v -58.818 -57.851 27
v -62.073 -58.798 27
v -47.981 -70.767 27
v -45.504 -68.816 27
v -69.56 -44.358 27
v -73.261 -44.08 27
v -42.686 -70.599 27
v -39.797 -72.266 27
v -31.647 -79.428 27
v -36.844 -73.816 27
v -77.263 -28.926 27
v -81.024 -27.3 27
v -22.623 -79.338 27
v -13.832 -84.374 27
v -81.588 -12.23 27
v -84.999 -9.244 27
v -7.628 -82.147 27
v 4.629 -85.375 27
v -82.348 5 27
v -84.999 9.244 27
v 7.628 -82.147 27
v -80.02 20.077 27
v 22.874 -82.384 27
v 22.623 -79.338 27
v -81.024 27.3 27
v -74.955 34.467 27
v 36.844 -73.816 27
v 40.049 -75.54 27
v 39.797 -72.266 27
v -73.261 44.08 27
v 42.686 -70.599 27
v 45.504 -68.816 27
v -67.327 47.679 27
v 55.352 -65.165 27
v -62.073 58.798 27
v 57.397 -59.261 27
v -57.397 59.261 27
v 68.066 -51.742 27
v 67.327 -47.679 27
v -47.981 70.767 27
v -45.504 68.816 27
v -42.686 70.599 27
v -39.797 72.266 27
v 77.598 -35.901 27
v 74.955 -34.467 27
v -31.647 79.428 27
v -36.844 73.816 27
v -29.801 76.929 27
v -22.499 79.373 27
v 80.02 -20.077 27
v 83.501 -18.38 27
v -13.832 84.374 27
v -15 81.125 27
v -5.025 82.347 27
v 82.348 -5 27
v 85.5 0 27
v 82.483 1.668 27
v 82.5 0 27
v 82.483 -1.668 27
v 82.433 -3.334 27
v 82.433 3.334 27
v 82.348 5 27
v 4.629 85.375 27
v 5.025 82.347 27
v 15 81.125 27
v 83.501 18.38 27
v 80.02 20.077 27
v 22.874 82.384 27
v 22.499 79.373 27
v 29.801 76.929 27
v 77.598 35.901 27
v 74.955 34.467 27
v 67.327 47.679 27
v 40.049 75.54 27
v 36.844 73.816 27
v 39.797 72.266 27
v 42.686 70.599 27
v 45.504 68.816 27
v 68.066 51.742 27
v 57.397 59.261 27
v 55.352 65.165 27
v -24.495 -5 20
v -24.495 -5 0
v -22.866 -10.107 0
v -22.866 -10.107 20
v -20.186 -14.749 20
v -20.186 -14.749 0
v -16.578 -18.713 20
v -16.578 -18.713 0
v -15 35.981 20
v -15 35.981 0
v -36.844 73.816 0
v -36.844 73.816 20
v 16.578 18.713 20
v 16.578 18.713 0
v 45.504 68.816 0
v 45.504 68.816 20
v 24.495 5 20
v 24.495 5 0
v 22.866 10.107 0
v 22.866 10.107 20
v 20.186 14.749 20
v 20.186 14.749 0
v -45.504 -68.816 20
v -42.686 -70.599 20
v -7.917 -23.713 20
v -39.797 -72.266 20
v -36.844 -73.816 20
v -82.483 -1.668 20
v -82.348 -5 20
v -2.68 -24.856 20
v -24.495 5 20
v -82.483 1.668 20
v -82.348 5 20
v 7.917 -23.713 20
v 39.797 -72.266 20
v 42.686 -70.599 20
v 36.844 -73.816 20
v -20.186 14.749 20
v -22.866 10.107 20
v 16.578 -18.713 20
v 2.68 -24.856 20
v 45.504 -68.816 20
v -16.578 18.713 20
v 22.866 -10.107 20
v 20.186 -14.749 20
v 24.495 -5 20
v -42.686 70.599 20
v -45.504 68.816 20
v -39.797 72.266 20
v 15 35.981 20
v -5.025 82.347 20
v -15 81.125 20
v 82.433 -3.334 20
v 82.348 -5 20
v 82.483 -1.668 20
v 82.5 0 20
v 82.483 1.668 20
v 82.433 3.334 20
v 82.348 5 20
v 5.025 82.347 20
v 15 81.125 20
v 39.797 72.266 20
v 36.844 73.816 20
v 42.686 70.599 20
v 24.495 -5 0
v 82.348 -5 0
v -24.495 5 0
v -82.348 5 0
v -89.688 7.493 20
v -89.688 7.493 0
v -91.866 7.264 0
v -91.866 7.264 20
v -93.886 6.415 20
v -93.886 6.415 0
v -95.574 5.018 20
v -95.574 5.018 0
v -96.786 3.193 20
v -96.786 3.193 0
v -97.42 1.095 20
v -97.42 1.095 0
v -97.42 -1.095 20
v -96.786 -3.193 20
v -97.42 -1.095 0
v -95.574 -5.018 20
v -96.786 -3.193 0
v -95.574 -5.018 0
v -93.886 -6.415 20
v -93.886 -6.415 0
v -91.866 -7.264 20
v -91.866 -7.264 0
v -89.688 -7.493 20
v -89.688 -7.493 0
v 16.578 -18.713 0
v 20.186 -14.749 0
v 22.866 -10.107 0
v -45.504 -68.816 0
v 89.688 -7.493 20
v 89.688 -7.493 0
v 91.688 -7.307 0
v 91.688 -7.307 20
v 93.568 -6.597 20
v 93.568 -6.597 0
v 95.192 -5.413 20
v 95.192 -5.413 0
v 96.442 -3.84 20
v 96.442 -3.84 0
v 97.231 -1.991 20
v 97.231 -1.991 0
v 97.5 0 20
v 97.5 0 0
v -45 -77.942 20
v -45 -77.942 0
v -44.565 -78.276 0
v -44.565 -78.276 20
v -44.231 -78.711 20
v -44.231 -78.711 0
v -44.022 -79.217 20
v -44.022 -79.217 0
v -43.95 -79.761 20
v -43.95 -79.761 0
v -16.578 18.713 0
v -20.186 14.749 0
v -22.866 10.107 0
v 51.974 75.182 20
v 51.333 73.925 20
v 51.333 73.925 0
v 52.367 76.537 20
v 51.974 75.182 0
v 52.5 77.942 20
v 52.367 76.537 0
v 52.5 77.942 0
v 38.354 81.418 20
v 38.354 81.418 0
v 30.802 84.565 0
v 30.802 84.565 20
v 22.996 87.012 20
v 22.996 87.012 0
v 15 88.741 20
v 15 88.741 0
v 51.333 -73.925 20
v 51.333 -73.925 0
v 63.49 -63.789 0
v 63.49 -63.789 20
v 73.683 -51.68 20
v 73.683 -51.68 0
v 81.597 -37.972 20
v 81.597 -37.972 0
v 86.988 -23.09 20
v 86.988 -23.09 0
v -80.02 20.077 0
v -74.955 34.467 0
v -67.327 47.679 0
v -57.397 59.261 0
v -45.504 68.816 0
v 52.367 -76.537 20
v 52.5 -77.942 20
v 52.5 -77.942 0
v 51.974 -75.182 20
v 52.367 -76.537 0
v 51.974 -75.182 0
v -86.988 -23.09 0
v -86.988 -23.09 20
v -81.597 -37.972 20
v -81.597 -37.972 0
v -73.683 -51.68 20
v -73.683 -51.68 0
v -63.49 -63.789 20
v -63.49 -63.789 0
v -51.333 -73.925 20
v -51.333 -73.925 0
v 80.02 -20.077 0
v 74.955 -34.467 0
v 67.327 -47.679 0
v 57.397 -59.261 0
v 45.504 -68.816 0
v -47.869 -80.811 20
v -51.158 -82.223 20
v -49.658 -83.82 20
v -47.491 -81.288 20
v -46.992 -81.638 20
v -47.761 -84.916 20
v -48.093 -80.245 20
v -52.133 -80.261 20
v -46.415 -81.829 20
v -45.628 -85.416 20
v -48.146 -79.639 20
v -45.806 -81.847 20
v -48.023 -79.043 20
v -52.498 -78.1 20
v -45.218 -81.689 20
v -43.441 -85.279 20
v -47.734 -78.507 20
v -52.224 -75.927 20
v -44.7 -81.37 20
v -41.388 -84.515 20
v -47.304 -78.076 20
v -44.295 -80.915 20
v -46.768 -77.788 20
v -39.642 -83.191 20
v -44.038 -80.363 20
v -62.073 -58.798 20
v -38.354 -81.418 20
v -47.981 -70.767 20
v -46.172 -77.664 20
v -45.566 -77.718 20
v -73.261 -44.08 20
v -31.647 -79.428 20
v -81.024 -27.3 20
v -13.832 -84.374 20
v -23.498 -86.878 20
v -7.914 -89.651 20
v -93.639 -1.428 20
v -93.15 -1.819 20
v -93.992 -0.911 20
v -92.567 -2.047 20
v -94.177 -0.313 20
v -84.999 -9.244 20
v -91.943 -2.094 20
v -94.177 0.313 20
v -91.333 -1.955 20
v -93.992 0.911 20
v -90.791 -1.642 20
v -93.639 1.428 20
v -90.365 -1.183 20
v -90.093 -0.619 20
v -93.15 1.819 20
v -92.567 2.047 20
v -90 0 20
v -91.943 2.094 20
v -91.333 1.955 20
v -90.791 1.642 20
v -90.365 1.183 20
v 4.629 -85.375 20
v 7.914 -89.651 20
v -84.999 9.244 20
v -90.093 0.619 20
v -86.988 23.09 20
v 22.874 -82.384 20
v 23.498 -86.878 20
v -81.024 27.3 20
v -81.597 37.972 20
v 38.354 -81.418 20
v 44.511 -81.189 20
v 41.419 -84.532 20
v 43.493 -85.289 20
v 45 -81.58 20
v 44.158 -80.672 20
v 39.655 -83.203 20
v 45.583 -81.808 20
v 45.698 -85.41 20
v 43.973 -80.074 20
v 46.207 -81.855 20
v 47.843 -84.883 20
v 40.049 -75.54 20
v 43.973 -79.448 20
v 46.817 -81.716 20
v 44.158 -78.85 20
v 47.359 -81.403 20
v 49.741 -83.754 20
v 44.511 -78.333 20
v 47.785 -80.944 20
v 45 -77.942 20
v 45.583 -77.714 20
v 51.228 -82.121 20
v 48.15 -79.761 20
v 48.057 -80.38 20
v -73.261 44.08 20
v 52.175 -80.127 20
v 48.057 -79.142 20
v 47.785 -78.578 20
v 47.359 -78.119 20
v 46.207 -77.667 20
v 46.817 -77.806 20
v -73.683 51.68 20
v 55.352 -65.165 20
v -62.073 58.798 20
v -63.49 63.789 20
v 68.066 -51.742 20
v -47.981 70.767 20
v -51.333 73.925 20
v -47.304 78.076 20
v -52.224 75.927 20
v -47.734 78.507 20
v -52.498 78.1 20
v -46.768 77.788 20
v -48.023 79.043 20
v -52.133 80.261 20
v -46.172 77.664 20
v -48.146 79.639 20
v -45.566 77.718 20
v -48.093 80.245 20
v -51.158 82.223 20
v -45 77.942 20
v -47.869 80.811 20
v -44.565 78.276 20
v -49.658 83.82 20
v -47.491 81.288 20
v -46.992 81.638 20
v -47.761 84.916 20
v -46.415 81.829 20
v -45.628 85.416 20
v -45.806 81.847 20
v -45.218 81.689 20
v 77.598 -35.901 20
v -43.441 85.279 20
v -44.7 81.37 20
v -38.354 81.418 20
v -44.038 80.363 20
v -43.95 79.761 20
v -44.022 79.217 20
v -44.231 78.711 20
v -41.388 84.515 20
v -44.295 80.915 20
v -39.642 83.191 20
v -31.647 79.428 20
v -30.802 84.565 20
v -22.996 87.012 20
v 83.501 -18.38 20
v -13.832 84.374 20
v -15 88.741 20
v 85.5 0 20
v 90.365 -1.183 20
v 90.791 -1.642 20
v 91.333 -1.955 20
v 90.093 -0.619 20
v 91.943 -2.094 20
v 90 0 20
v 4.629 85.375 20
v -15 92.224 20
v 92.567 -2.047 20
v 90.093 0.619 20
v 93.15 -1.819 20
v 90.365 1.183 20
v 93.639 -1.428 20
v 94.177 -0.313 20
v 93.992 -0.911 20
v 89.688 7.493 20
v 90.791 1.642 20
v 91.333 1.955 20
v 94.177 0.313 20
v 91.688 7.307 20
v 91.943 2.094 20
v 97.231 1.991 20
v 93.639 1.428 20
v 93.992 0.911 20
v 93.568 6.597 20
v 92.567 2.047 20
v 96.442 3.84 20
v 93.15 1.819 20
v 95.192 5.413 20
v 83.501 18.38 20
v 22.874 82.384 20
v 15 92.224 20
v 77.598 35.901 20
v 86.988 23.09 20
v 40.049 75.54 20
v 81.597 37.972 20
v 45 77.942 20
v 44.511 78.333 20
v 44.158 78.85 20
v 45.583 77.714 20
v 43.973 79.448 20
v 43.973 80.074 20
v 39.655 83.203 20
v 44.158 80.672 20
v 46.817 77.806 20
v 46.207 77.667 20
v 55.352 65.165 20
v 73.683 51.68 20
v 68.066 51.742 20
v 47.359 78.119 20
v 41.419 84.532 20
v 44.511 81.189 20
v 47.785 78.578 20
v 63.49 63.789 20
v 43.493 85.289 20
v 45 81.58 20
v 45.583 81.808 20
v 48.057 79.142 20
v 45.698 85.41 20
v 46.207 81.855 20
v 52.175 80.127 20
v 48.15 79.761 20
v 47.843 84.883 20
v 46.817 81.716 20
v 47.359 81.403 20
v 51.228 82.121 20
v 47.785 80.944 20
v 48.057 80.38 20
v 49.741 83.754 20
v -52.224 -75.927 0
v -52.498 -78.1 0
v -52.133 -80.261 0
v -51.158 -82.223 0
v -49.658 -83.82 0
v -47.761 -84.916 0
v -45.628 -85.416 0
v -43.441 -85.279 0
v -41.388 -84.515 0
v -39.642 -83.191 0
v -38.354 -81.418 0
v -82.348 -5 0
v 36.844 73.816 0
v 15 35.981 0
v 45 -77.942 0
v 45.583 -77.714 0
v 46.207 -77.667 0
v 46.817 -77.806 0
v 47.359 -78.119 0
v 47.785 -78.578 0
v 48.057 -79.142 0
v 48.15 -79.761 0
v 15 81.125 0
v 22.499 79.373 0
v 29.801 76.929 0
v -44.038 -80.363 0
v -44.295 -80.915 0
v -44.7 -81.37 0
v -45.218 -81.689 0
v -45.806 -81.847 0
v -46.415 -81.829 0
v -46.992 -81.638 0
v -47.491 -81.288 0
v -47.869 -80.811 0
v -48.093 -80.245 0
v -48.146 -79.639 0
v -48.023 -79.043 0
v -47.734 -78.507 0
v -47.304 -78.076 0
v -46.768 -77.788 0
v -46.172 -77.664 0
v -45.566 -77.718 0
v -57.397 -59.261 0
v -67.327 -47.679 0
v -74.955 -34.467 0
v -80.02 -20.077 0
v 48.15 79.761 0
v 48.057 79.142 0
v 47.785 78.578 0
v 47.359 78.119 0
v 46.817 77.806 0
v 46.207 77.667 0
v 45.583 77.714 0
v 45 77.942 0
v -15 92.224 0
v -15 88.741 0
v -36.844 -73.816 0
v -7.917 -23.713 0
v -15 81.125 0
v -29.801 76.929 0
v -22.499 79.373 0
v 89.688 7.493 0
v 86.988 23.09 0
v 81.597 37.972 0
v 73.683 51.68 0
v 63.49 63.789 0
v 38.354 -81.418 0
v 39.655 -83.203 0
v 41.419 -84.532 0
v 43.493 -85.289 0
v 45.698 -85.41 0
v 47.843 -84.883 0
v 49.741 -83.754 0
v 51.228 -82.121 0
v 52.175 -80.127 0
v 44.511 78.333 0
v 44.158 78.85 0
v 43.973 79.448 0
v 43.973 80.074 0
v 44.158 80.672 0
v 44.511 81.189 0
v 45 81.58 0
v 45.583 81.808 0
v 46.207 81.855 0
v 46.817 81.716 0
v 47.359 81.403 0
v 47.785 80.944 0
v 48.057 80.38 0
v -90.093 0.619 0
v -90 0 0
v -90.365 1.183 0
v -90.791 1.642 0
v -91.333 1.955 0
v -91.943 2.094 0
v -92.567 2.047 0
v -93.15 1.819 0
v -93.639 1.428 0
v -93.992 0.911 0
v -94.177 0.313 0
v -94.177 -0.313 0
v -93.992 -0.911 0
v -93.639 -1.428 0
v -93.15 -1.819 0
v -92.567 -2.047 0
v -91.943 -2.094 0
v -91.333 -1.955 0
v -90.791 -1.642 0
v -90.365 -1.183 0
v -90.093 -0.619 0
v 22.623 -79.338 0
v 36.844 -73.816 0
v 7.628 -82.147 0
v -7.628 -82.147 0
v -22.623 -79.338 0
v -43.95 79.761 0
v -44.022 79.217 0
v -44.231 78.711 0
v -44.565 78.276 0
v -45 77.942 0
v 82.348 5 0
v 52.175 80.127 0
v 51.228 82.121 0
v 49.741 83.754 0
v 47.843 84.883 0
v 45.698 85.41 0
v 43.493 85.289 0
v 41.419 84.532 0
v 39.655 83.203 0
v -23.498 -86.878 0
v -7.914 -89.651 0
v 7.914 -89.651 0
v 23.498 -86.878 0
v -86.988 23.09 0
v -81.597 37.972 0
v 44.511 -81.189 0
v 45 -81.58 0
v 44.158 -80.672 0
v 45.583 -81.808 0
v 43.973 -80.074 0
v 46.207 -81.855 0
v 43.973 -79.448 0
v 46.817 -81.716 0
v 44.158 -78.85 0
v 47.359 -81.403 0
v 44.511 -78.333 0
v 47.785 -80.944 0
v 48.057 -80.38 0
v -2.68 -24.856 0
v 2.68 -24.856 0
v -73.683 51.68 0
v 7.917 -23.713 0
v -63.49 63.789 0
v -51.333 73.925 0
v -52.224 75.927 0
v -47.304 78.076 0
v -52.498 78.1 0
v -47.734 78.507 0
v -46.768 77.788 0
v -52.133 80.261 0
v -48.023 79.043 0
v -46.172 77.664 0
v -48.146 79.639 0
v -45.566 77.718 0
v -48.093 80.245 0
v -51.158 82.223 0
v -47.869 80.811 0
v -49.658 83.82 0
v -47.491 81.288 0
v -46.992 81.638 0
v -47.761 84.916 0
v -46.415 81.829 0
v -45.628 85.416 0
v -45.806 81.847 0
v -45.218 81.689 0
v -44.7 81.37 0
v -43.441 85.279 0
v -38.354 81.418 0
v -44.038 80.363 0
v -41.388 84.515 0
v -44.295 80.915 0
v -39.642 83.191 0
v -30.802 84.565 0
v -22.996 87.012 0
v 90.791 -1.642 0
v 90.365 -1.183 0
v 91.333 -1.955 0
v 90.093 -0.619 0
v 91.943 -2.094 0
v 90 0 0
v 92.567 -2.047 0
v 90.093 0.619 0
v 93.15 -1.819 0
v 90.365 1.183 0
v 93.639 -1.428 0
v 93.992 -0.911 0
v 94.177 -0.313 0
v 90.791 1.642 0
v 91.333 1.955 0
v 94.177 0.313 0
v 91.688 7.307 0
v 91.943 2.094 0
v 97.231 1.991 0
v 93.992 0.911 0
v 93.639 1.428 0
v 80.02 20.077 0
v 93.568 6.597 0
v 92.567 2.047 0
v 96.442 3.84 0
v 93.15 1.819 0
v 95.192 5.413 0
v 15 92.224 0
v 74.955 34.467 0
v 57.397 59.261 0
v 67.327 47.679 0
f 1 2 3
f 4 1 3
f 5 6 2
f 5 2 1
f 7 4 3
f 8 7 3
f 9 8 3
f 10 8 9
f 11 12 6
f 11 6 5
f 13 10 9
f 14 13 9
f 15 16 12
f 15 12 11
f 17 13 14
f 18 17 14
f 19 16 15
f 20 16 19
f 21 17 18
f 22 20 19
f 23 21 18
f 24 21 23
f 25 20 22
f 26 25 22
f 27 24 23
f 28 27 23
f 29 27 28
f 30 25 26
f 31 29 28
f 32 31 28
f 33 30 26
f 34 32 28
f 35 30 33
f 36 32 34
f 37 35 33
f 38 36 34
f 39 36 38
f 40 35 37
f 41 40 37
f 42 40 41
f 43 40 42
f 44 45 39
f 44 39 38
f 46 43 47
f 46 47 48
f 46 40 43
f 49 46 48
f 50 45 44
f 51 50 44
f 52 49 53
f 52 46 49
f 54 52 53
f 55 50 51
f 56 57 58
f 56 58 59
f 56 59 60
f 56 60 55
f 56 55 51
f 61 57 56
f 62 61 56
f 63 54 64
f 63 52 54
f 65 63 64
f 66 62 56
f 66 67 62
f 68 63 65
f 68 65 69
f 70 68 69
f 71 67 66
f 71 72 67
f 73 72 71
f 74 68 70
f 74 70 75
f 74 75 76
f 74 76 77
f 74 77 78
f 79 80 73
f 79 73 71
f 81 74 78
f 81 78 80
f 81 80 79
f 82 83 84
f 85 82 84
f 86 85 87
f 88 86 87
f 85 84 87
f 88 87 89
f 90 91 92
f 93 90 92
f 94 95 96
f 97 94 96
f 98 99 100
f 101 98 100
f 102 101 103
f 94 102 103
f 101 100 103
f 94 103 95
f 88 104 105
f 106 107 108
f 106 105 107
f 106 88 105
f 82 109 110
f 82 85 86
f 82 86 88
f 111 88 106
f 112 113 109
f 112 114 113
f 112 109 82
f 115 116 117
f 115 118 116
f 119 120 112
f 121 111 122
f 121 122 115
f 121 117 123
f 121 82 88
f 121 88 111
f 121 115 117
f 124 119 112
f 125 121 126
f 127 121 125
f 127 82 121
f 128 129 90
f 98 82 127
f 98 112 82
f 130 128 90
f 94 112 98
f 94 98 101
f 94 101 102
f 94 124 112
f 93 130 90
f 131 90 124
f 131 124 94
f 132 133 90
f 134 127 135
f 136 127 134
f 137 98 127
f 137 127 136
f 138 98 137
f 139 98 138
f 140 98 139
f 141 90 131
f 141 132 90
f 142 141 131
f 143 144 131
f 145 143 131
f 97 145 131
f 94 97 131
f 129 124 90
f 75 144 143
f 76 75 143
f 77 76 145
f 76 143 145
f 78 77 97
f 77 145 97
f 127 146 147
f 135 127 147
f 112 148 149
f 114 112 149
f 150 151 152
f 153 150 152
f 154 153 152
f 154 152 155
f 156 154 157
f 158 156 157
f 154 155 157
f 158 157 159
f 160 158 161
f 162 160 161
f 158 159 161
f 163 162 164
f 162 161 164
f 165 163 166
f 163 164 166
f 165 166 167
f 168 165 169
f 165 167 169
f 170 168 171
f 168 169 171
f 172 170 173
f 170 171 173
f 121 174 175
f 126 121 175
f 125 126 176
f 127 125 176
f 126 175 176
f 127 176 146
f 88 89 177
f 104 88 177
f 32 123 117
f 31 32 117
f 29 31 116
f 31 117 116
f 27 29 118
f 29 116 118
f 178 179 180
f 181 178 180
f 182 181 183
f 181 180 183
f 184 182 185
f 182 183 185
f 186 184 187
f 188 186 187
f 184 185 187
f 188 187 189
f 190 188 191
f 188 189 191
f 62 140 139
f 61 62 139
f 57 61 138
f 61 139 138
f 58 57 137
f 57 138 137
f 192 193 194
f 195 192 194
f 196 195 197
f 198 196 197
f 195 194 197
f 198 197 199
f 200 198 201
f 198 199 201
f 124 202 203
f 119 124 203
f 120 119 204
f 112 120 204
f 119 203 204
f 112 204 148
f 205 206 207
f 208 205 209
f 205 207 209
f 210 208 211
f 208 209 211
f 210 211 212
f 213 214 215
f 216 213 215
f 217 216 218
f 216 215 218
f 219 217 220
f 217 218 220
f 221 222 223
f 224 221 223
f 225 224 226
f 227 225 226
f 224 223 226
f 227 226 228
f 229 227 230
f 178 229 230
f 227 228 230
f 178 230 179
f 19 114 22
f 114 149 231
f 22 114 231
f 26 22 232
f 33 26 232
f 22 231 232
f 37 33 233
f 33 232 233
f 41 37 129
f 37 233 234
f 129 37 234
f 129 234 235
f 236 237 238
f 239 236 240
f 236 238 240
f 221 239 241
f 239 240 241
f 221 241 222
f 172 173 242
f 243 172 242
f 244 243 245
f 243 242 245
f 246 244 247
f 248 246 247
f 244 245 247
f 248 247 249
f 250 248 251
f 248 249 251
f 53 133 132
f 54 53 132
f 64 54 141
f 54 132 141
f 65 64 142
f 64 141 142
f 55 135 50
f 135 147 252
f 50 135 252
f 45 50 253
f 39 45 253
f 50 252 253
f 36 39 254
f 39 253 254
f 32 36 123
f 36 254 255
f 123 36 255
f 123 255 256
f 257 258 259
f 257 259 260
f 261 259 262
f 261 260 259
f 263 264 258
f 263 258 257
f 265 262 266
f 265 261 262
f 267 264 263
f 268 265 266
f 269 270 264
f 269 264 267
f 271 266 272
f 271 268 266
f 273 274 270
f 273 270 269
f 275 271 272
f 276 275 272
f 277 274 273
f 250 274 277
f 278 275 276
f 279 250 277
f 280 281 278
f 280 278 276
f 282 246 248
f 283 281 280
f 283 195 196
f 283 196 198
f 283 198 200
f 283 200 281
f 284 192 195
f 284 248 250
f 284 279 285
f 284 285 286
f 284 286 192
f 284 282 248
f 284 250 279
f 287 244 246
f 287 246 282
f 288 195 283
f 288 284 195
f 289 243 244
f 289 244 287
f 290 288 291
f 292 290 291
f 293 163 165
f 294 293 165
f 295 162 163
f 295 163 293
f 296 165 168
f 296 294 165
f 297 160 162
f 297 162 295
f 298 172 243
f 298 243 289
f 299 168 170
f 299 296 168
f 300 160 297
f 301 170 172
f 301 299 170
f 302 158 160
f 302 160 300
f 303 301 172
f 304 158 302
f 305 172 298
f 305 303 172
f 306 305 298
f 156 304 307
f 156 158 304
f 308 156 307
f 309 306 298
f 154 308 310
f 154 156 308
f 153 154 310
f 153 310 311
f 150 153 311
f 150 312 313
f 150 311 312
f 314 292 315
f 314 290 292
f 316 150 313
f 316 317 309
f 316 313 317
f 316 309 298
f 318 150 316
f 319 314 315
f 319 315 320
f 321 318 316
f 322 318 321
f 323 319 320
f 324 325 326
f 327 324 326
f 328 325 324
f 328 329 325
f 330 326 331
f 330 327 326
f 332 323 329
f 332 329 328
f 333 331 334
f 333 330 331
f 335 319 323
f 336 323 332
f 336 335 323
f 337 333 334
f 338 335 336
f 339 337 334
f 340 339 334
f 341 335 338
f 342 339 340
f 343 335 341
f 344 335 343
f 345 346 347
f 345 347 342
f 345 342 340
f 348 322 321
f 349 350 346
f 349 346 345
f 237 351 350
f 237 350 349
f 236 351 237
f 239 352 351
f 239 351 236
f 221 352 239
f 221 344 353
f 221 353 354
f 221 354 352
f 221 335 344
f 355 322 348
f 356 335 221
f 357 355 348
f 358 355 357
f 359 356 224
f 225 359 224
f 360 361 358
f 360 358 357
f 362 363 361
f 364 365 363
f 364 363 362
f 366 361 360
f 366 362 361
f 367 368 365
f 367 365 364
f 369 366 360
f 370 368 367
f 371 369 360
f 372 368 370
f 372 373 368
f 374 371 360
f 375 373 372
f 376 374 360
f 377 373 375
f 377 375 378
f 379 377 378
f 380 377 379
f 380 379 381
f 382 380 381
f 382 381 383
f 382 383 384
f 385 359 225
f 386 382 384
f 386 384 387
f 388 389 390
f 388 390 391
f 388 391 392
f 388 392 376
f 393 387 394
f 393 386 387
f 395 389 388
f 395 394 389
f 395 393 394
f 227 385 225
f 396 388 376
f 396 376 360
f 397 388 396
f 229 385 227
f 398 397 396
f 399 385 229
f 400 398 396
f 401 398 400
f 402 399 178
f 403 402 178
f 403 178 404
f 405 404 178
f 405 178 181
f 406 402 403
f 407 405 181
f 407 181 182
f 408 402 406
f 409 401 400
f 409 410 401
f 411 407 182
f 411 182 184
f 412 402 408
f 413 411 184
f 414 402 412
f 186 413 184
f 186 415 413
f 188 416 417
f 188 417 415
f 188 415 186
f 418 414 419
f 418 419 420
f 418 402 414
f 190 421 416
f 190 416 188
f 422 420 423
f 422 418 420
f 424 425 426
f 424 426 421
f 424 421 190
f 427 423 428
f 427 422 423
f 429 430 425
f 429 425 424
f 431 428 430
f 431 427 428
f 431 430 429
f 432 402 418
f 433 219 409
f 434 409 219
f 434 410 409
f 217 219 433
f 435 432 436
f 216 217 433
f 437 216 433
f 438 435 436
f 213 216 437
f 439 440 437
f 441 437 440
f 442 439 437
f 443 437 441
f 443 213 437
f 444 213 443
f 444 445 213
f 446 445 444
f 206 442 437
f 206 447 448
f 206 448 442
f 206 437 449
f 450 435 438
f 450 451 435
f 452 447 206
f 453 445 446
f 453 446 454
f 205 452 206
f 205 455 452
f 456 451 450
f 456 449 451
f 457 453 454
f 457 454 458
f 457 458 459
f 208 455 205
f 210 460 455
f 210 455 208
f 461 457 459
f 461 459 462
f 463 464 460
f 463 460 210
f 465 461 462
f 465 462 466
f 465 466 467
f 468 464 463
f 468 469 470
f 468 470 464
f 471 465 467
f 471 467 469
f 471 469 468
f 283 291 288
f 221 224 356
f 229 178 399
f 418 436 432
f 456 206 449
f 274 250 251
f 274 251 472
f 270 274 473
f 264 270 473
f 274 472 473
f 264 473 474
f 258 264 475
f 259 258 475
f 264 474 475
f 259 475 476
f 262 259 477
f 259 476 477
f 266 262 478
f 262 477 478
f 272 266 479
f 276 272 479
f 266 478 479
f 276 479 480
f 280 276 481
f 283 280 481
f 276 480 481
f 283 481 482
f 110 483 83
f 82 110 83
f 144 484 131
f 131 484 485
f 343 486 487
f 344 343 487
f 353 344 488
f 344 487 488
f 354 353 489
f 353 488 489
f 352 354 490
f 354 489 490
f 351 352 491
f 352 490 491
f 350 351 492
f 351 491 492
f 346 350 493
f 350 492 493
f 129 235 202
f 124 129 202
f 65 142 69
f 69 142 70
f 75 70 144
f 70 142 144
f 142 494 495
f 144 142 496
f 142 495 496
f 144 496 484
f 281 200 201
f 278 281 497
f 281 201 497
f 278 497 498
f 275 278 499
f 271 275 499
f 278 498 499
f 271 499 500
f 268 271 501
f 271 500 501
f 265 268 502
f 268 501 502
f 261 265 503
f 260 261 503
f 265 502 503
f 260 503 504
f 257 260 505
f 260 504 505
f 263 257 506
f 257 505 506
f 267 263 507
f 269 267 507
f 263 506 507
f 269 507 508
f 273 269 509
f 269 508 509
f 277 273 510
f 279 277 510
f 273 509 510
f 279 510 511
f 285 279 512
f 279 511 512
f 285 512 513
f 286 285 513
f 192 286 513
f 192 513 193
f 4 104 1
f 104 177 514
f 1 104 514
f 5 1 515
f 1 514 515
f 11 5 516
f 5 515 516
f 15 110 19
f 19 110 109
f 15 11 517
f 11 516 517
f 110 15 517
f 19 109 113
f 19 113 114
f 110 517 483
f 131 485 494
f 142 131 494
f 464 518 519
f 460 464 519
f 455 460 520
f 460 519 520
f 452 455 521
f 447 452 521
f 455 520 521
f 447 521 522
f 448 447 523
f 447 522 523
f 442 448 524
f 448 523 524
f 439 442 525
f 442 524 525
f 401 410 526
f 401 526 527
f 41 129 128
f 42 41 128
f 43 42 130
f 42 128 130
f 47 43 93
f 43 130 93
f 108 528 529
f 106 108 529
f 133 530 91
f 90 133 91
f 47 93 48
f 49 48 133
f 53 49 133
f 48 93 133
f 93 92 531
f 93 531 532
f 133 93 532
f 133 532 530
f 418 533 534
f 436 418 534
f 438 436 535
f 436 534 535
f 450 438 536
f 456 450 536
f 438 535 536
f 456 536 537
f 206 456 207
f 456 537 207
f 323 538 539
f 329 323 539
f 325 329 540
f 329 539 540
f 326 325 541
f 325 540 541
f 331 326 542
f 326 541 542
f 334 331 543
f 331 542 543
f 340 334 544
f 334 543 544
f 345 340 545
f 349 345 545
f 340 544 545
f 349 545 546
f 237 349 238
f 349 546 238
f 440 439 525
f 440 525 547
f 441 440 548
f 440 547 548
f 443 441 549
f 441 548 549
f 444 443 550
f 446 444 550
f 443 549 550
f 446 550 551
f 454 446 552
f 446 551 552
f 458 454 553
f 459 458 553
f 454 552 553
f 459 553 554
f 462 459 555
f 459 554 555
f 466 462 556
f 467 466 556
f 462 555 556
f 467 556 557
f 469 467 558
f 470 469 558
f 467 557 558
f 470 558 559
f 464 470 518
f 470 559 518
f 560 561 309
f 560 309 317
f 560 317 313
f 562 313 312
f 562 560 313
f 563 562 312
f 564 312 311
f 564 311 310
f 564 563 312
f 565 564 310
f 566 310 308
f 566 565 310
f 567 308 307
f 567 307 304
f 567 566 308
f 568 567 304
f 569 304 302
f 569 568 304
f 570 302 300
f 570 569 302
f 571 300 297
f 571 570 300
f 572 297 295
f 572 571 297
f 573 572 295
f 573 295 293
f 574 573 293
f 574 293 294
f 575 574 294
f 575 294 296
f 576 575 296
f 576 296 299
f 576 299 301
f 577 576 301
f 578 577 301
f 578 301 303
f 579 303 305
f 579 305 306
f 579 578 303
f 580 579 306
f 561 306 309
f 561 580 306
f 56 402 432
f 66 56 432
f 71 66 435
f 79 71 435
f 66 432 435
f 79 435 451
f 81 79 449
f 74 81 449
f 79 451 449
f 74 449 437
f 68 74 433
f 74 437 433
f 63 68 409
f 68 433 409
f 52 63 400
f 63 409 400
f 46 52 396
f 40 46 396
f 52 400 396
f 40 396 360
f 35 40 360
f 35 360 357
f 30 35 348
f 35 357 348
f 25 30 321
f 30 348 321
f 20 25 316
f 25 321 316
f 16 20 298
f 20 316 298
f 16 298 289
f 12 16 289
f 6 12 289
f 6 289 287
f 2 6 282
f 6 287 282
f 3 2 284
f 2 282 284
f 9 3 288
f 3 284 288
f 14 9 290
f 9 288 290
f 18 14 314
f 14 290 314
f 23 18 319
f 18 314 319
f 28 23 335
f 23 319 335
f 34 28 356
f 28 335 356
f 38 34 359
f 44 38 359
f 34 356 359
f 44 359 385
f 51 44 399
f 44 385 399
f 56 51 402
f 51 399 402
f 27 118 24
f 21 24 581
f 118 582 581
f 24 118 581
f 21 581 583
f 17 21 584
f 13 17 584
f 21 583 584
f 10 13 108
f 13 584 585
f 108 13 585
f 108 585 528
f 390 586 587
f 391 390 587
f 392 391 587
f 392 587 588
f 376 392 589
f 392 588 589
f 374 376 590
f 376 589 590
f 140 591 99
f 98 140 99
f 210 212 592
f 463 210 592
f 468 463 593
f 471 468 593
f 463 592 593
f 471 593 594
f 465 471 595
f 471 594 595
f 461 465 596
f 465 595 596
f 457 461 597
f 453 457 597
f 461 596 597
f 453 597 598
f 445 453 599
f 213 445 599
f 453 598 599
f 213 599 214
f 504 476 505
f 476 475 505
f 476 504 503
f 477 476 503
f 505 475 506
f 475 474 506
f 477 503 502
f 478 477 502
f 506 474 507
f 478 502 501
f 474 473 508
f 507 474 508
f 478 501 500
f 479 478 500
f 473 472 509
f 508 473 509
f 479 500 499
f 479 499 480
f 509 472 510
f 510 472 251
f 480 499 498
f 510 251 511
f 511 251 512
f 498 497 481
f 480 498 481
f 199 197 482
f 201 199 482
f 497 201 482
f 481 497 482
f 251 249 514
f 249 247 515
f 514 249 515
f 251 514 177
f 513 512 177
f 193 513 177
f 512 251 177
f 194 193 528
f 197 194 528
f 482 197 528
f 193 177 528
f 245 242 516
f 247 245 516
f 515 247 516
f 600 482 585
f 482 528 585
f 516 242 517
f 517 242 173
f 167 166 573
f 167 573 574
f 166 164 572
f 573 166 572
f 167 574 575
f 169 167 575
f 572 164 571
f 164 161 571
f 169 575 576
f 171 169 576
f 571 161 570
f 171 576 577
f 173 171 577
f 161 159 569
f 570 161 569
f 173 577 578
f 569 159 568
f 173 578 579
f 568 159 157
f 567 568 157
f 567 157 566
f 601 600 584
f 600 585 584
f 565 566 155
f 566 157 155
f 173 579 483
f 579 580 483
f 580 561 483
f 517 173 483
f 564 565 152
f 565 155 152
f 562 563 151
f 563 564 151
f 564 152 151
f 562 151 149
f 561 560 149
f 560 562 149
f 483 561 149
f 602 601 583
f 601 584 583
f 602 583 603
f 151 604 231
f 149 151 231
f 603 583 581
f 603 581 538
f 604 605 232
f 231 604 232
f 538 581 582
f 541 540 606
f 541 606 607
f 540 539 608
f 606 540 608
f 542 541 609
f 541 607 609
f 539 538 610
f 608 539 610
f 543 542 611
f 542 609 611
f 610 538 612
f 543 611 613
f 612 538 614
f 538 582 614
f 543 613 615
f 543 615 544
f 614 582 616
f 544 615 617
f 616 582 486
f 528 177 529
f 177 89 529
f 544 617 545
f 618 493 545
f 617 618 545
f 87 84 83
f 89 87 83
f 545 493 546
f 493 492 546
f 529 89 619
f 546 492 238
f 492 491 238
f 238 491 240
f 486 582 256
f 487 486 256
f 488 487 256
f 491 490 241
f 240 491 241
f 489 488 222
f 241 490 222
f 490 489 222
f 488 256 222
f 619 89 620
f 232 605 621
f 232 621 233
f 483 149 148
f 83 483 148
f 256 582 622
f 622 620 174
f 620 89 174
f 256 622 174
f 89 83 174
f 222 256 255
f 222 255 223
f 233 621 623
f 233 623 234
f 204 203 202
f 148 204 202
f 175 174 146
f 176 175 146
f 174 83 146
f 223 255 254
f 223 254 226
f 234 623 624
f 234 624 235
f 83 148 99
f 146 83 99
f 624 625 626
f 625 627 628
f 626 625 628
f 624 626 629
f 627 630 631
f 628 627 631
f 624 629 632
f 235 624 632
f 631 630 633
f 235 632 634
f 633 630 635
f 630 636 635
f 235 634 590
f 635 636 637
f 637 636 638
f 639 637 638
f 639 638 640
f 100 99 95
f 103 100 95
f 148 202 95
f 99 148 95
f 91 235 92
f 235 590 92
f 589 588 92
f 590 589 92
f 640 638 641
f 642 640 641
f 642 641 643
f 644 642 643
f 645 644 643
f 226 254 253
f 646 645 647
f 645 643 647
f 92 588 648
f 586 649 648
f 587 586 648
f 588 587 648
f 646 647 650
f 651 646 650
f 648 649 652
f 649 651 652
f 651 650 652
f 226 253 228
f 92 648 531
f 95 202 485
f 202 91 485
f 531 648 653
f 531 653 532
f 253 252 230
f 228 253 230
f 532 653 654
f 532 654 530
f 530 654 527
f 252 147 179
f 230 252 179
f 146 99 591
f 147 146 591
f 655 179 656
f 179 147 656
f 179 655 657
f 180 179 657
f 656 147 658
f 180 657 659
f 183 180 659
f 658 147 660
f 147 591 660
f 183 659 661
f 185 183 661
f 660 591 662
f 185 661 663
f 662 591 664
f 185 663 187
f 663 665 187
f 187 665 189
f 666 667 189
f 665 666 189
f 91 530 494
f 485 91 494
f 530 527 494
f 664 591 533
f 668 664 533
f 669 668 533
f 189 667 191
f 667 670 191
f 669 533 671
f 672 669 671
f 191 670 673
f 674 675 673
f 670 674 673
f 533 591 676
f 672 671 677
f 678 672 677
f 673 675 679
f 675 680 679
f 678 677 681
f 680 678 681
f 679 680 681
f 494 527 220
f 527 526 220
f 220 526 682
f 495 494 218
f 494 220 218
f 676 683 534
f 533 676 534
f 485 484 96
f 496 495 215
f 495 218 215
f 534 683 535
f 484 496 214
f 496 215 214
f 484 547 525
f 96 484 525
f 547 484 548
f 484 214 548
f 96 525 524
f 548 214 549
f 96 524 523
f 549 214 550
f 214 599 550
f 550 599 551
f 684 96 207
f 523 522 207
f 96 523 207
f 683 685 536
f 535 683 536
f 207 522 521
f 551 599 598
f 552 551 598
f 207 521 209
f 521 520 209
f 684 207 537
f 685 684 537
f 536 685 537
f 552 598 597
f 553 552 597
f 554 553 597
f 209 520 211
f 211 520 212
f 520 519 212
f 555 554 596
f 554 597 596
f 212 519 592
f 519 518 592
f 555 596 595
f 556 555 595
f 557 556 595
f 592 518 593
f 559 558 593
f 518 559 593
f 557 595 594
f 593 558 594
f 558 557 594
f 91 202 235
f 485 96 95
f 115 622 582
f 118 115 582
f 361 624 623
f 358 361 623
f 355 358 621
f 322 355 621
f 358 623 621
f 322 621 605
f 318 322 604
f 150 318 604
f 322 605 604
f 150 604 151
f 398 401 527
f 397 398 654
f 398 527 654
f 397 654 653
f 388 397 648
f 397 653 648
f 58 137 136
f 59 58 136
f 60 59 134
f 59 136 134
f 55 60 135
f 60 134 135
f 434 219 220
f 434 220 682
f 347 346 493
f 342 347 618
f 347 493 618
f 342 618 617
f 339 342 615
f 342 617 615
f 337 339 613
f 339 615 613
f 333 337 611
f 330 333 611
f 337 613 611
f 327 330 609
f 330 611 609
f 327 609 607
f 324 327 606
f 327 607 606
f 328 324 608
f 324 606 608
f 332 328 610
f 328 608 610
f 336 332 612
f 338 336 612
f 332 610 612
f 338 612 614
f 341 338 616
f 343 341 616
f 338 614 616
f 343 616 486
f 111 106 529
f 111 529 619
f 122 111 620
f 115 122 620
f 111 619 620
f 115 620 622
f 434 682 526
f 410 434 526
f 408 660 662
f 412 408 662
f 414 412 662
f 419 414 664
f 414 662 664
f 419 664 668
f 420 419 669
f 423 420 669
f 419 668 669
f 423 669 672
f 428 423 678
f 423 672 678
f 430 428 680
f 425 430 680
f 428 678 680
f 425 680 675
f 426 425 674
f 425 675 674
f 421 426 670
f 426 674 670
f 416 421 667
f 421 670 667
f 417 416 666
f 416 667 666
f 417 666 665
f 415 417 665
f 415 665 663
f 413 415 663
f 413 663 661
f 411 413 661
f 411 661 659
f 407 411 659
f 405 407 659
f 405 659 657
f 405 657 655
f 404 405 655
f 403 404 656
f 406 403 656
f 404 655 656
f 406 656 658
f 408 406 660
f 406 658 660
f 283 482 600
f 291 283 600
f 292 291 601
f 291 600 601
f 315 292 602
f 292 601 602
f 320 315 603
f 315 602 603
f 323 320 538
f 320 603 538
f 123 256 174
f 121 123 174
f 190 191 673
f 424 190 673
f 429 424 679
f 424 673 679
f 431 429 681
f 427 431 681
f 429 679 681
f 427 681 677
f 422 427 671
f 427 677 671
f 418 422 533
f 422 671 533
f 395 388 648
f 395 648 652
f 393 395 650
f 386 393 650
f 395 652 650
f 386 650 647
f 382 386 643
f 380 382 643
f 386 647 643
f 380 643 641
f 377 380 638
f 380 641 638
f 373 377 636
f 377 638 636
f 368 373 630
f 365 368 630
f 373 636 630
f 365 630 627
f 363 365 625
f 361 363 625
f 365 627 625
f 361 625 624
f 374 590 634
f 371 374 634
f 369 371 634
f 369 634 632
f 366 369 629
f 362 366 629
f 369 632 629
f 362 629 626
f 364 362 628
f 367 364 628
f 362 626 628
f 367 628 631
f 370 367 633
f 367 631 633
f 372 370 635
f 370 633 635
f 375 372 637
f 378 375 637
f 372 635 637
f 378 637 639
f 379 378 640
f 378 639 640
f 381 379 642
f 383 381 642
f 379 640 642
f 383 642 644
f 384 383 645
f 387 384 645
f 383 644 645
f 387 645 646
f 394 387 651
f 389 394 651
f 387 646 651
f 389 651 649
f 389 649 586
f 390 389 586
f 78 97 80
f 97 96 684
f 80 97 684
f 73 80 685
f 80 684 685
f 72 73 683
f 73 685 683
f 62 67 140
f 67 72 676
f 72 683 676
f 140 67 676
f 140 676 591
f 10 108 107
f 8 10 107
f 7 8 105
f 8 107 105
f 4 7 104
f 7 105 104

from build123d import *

# Parameters (mm, degrees)
F0_R     = 2.1
F1_DEPTH = 20
F2_R     = 85.5
F3_DEPTH = 7


with BuildPart() as f1:
    # F0 (on Top) → F1 (new body)
    with BuildSketch(Plane.XY):
        with BuildLine():
            ThreePointArc((-41.2500001071, 71.4470957504), (-46.7897627263, 70.6589663982), (-51.3332998929, 73.9249100243))
            ThreePointArc((-51.3332998929, 73.9249100243), (-77.9422863406, 45), (-89.6875, 7.4934867552))
            ThreePointArc((-89.6875, 7.4934867552), (-84.5873412263, 5.1916399143), (-82.5, 0))
            ThreePointArc((-82.5, 0), (-82.4620776492, 2.5011496906), (-82.34834546, 5))
            ThreePointArc((-82.34834546, 5), (-71.4470958122, 41.25), (-45.5042997489, 68.815759128))
            ThreePointArc((-45.5042997489, 68.815759128), (-43.3970980479, 70.1636792152), (-41.2500001071, 71.4470957504))
        make_face()
        with BuildLine():
            ThreePointArc((-37.5, 77.9422863406), (-37.7166800428, 79.7320490069), (-38.3542001071, 81.4183967795))
            ThreePointArc((-38.3542001071, 81.4183967795), (-41.7133252765, 79.7495987098), (-45.0000000188, 77.9422863298))
            ThreePointArc((-45.0000000188, 77.9422863298), (-48.2085158044, 75.999598709), (-51.3332998929, 73.9249100243))
            ThreePointArc((-51.3332998929, 73.9249100243), (-46.7897627263, 70.6589663982), (-41.2500001071, 71.4470957504))
            ThreePointArc((-41.2500001071, 71.4470957504), (-38.5048095025, 74.1922862871), (-37.5, 77.9422863406))
        make_face()
        with BuildLine():
            ThreePointArc((-45.0000000188, 77.9422863298), (-41.7133252765, 79.7495987098), (-38.3542001071, 81.4183967795))
            ThreePointArc((-38.3542001071, 81.4183967795), (-48.75, 84.437476869), (-51.3332998929, 73.9249100243))
            ThreePointArc((-51.3332998929, 73.9249100243), (-48.2085158044, 75.999598709), (-45.0000000188, 77.9422863298))
        make_face()
        with BuildLine():
            ThreePointArc((-43.95, 79.7609396885), (-44.2313466575, 78.7109396792), (-45.0000000188, 77.9422863298))
            ThreePointArc((-45.0000000188, 77.9422863298), (-47.8686533425, 80.8109396979), (-43.95, 79.7609396885))
        make_face(mode=Mode.SUBTRACT)
        with BuildLine():
            Line((-15, 81.1249036979), (-15, 88.7411967465))
            ThreePointArc((-15, 88.7411967465), (-26.9271891795, 85.8773921524), (-38.3542001071, 81.4183967795))
            ThreePointArc((-38.3542001071, 81.4183967795), (-37.7166800428, 79.7320490069), (-37.5, 77.9422863406))
            ThreePointArc((-37.5, 77.9422863406), (-38.5048095025, 74.1922862871), (-41.2500001071, 71.4470957504))
            ThreePointArc((-41.2500001071, 71.4470957504), (-39.0649797083, 72.6648289091), (-36.8440457111, 73.815759128))
            ThreePointArc((-36.8440457111, 73.815759128), (-26.1783721325, 78.2364546263), (-15, 81.1249036979))
        make_face()
        with BuildLine():
            Line((15, 81.1249036979), (15, 88.7411967465))
            ThreePointArc((15, 88.7411967465), (0, 90), (-15, 88.7411967465))
            Line((-15, 88.7411967465), (-15, 81.1249036979))
            ThreePointArc((-15, 81.1249036979), (0, 82.5), (15, 81.1249036979))
        make_face()
        with BuildLine():
            ThreePointArc((-15, 88.7411967465), (0, 90), (15, 88.7411967465))
            Line((15, 88.7411967465), (15, 92.22432971))
            Line((15, 92.22432971), (-15, 92.22432971))
            Line((-15, 92.22432971), (-15, 88.7411967465))
        make_face()
        with BuildLine():
            ThreePointArc((36.8440457111, 73.815759128), (39.0649794612, 72.664829042), (41.2499996211, 71.447096031))
            ThreePointArc((41.2499996211, 71.447096031), (37.7975784991, 75.8506065078), (38.3542001071, 81.4183967795))
            ThreePointArc((38.3542001071, 81.4183967795), (26.9271891795, 85.8773921524), (15, 88.7411967465))
            Line((15, 88.7411967465), (15, 81.1249036979))
            ThreePointArc((15, 81.1249036979), (26.1783721325, 78.2364546263), (36.8440457111, 73.815759128))
        make_face()
        with BuildLine():
            ThreePointArc((41.2499996211, 71.447096031), (46.7897624538, 70.6589663312), (51.3332998929, 73.9249100243))
            ThreePointArc((51.3332998929, 73.9249100243), (48.2085157624, 75.9995987357), (44.9999999326, 77.9422863795))
            ThreePointArc((44.9999999326, 77.9422863795), (41.7133252324, 79.7495987329), (38.3542001071, 81.4183967795))
            ThreePointArc((38.3542001071, 81.4183967795), (37.7975784991, 75.8506065078), (41.2499996211, 71.447096031))
        make_face()
        with BuildLine():
            ThreePointArc((44.9999999326, 77.9422863795), (48.2085157624, 75.9995987357), (51.3332998929, 73.9249100243))
            ThreePointArc((51.3332998929, 73.9249100243), (52.2024214399, 75.8506062978), (52.5, 77.9422863406))
            ThreePointArc((52.5, 77.9422863406), (46.7897626663, 85.2256062978), (38.3542001071, 81.4183967795))
            ThreePointArc((38.3542001071, 81.4183967795), (41.7133252324, 79.7495987329), (44.9999999326, 77.9422863795))
        make_face()
        with BuildLine():
            ThreePointArc((48.15, 79.7609396885), (47.0999999663, 77.9422863211), (44.9999999326, 77.9422863795))
            ThreePointArc((44.9999999326, 77.9422863795), (45.0000000337, 81.5795930559), (48.15, 79.7609396885))
        make_face(mode=Mode.SUBTRACT)
        with BuildLine():
            ThreePointArc((82.5, 0), (84.5873412263, 5.1916399143), (89.6875, 7.4934867552))
            ThreePointArc((89.6875, 7.4934867552), (77.9422863406, 45), (51.3332998929, 73.9249100243))
            ThreePointArc((51.3332998929, 73.9249100243), (46.7897624538, 70.6589663312), (41.2499996211, 71.447096031))
            ThreePointArc((41.2499996211, 71.447096031), (43.3970978093, 70.1636793628), (45.5042997489, 68.815759128))
            ThreePointArc((45.5042997489, 68.815759128), (71.4470958122, 41.25), (82.34834546, 5))
            ThreePointArc((82.34834546, 5), (82.4620776492, 2.5011496906), (82.5, 0))
        make_face()
        with BuildLine():
            ThreePointArc((89.6875, -7.4934867552), (89.9218410621, -3.75), (90, 0))
            ThreePointArc((90, 0), (89.9218410621, 3.75), (89.6875, 7.4934867552))
            ThreePointArc((89.6875, 7.4934867552), (84.5873412263, 5.1916399143), (82.5, 0))
            ThreePointArc((82.5, 0), (84.5873412263, -5.1916399143), (89.6875, -7.4934867552))
        make_face()
        with BuildLine():
            ThreePointArc((89.6875, 7.4934867552), (89.9218410621, 3.75), (90, 0))
            ThreePointArc((90, 0), (89.9218410621, -3.75), (89.6875, -7.4934867552))
            ThreePointArc((89.6875, -7.4934867552), (95.1916399143, -5.4126587737), (97.5, 0))
            ThreePointArc((97.5, 0), (95.1916399143, 5.4126587737), (89.6875, 7.4934867552))
        make_face()
        with BuildLine():
            ThreePointArc((94.2, 0), (92.1, -2.1), (90, 0))
            ThreePointArc((90, 0), (92.1, 2.1), (94.2, 0))
        make_face(mode=Mode.SUBTRACT)
        with BuildLine():
            ThreePointArc((51.3332998929, -73.9249100243), (77.9422863406, -45), (89.6875, -7.4934867552))
            ThreePointArc((89.6875, -7.4934867552), (84.5873412263, -5.1916399143), (82.5, 0))
            ThreePointArc((82.5, 0), (82.4620776492, -2.5011496906), (82.34834546, -5))
            ThreePointArc((82.34834546, -5), (71.4470958122, -41.25), (45.5042997489, -68.815759128))
            ThreePointArc((45.5042997489, -68.815759128), (43.3970980171, -70.1636792343), (41.2500000443, -71.4470957866))
            ThreePointArc((41.2500000443, -71.4470957866), (46.7897626911, -70.6589663895), (51.3332998929, -73.9249100243))
        make_face()
        with BuildLine():
            ThreePointArc((38.3542001071, -81.4183967795), (37.7975785672, -75.8506062732), (41.2500000443, -71.4470957866))
            ThreePointArc((41.2500000443, -71.4470957866), (39.0649796764, -72.6648289263), (36.8440457111, -73.815759128))
            ThreePointArc((36.8440457111, -73.815759128), (0, -82.5), (-36.8440457111, -73.815759128))
            ThreePointArc((-36.8440457111, -73.815759128), (-39.0649795946, -72.6648289702), (-41.2499998835, -71.4470958795))
            ThreePointArc((-41.2499998835, -71.4470958795), (-38.504809438, -74.1922863989), (-37.5, -77.9422863406))
            ThreePointArc((-37.5, -77.9422863406), (-37.7166800428, -79.7320490069), (-38.3542001071, -81.4183967795))
            ThreePointArc((-38.3542001071, -81.4183967795), (0, -90), (38.3542001071, -81.4183967795))
        make_face()
        with BuildLine():
            ThreePointArc((44.9999998533, -77.9422864253), (48.2085157237, -75.9995987602), (51.3332998929, -73.9249100243))
            ThreePointArc((51.3332998929, -73.9249100243), (46.7897626911, -70.6589663895), (41.2500000443, -71.4470957866))
            ThreePointArc((41.2500000443, -71.4470957866), (37.7975785672, -75.8506062732), (38.3542001071, -81.4183967795))
            ThreePointArc((38.3542001071, -81.4183967795), (41.7133251918, -79.7495987541), (44.9999998533, -77.9422864253))
        make_face()
        with BuildLine():
            ThreePointArc((52.5, -77.9422863406), (52.2024214399, -75.8506062978), (51.3332998929, -73.9249100243))
            ThreePointArc((51.3332998929, -73.9249100243), (48.2085157237, -75.9995987602), (44.9999998533, -77.9422864253))
            ThreePointArc((44.9999998533, -77.9422864253), (41.7133251918, -79.7495987541), (38.3542001071, -81.4183967795))
            ThreePointArc((38.3542001071, -81.4183967795), (46.7897626663, -85.2256062978), (52.5, -77.9422863406))
        make_face()
        with BuildLine():
            ThreePointArc((48.15, -79.7609396885), (45.0000000733, -81.5795930788), (44.9999998533, -77.9422864253))
            ThreePointArc((44.9999998533, -77.9422864253), (47.0999999267, -77.9422862983), (48.15, -79.7609396885))
        make_face(mode=Mode.SUBTRACT)
        with BuildLine():
            ThreePointArc((-44.99999973, -77.9422864965), (-41.7133251287, -79.7495987871), (-38.3542001071, -81.4183967795))
            ThreePointArc((-38.3542001071, -81.4183967795), (-37.7166800428, -79.7320490069), (-37.5, -77.9422863406))
            ThreePointArc((-37.5, -77.9422863406), (-38.504809438, -74.1922863989), (-41.2499998835, -71.4470958795))
            ThreePointArc((-41.2499998835, -71.4470958795), (-46.7897626009, -70.6589663674), (-51.3332998929, -73.9249100243))
            ThreePointArc((-51.3332998929, -73.9249100243), (-48.2085156636, -75.9995987984), (-44.99999973, -77.9422864965))
        make_face()
        with BuildLine():
            ThreePointArc((-51.3332998929, -73.9249100243), (-48.75, -84.437476869), (-38.3542001071, -81.4183967795))
            ThreePointArc((-38.3542001071, -81.4183967795), (-41.7133251287, -79.7495987871), (-44.99999973, -77.9422864965))
            ThreePointArc((-44.99999973, -77.9422864965), (-48.2085156636, -75.9995987984), (-51.3332998929, -73.9249100243))
        make_face()
        with BuildLine():
            ThreePointArc((-43.95, -79.7609396885), (-47.8686534259, -80.8109395535), (-44.99999973, -77.9422864965))
            ThreePointArc((-44.99999973, -77.9422864965), (-44.2313465741, -78.7109398236), (-43.95, -79.7609396885))
        make_face(mode=Mode.SUBTRACT)
        with BuildLine():
            ThreePointArc((-89.6875, -7.4934867552), (-77.9422863406, -45), (-51.3332998929, -73.9249100243))
            ThreePointArc((-51.3332998929, -73.9249100243), (-46.7897626009, -70.6589663674), (-41.2499998835, -71.4470958795))
            ThreePointArc((-41.2499998835, -71.4470958795), (-43.3970979381, -70.1636792831), (-45.5042997489, -68.815759128))
            ThreePointArc((-45.5042997489, -68.815759128), (-71.4470958122, -41.25), (-82.34834546, -5))
            ThreePointArc((-82.34834546, -5), (-82.4620776492, -2.5011496906), (-82.5, 0))
            ThreePointArc((-82.5, 0), (-84.5873412263, -5.1916399143), (-89.6875, -7.4934867552))
        make_face()
        with BuildLine():
            ThreePointArc((-90, 0), (-89.9218410621, -3.75), (-89.6875, -7.4934867552))
            ThreePointArc((-89.6875, -7.4934867552), (-84.5873412263, -5.1916399143), (-82.5, 0))
            ThreePointArc((-82.5, 0), (-84.5873412263, 5.1916399143), (-89.6875, 7.4934867552))
            ThreePointArc((-89.6875, 7.4934867552), (-89.9218410621, 3.75), (-90, 0))
        make_face()
        with BuildLine():
            ThreePointArc((-89.6875, 7.4934867552), (-97.5, 0), (-89.6875, -7.4934867552))
            ThreePointArc((-89.6875, -7.4934867552), (-89.9218410621, -3.75), (-90, 0))
            ThreePointArc((-90, 0), (-89.9218410621, 3.75), (-89.6875, 7.4934867552))
        make_face()
        with Locations((-92.1, 0)):
            Circle(F0_R, mode=Mode.SUBTRACT)
        with BuildLine():
            ThreePointArc((-82.34834546, 5), (-82.4620776492, 2.5011496906), (-82.5, 0))
            ThreePointArc((-82.5, 0), (-82.4620776492, -2.5011496906), (-82.34834546, -5))
            Line((-82.34834546, -5), (-24.4948974278, -5))
            ThreePointArc((-24.4948974278, -5), (-25, 0), (-24.4948974278, 5))
            Line((-24.4948974278, 5), (-82.34834546, 5))
        make_face()
        with BuildLine():
            ThreePointArc((-41.2499998835, -71.4470958795), (-39.0649795946, -72.6648289702), (-36.8440457111, -73.815759128))
            Line((-36.8440457111, -73.815759128), (-7.917321695, -23.7132034356))
            ThreePointArc((-7.917321695, -23.7132034356), (-12.5, -21.6506350946), (-16.5775757328, -18.7132034356))
            Line((-16.5775757328, -18.7132034356), (-45.5042997489, -68.815759128))
            ThreePointArc((-45.5042997489, -68.815759128), (-43.3970979381, -70.1636792831), (-41.2499998835, -71.4470958795))
        make_face()
        with BuildLine():
            ThreePointArc((36.8440457111, -73.815759128), (39.0649796764, -72.6648289263), (41.2500000443, -71.4470957866))
            ThreePointArc((41.2500000443, -71.4470957866), (43.3970980171, -70.1636792343), (45.5042997489, -68.815759128))
            Line((45.5042997489, -68.815759128), (16.5775757328, -18.7132034356))
            ThreePointArc((16.5775757328, -18.7132034356), (12.5, -21.6506350946), (7.917321695, -23.7132034356))
            Line((7.917321695, -23.7132034356), (36.8440457111, -73.815759128))
        make_face()
        with BuildLine():
            ThreePointArc((82.34834546, -5), (82.4620776492, -2.5011496906), (82.5, 0))
            ThreePointArc((82.5, 0), (82.4620776492, 2.5011496906), (82.34834546, 5))
            Line((82.34834546, 5), (24.4948974278, 5))
            ThreePointArc((24.4948974278, 5), (24.8734038251, 2.5127240501), (25, 0))
            ThreePointArc((25, 0), (24.8734038251, -2.5127240501), (24.4948974278, -5))
            Line((24.4948974278, -5), (82.34834546, -5))
        make_face()
        with BuildLine():
            ThreePointArc((45.5042997489, 68.815759128), (43.3970978093, 70.1636793628), (41.2499996211, 71.447096031))
            ThreePointArc((41.2499996211, 71.447096031), (39.0649794612, 72.664829042), (36.8440457111, 73.815759128))
            Line((36.8440457111, 73.815759128), (15, 35.9807621135))
            Line((15, 35.9807621135), (7.917321695, 23.7132034356))
            ThreePointArc((7.917321695, 23.7132034356), (12.5, 21.6506350946), (16.5775757328, 18.7132034356))
            Line((16.5775757328, 18.7132034356), (45.5042997489, 68.815759128))
        make_face()
        with BuildLine():
            ThreePointArc((-16.5775757328, 18.7132034356), (-12.5, 21.6506350946), (-7.917321695, 23.7132034356))
            Line((-7.917321695, 23.7132034356), (-15, 35.9807621135))
            Line((-15, 35.9807621135), (-36.8440457111, 73.815759128))
            ThreePointArc((-36.8440457111, 73.815759128), (-39.0649797083, 72.6648289091), (-41.2500001071, 71.4470957504))
            ThreePointArc((-41.2500001071, 71.4470957504), (-43.3970980479, 70.1636792152), (-45.5042997489, 68.815759128))
            Line((-45.5042997489, 68.815759128), (-16.5775757328, 18.7132034356))
        make_face()
        with BuildLine():
            ThreePointArc((25, 0), (24.8734038251, 2.5127240501), (24.4948974278, 5))
            ThreePointArc((24.4948974278, 5), (21.6506350946, 12.5), (16.5775757328, 18.7132034356))
            ThreePointArc((16.5775757328, 18.7132034356), (12.5, 21.6506350946), (7.917321695, 23.7132034356))
            ThreePointArc((7.917321695, 23.7132034356), (0, 25), (-7.917321695, 23.7132034356))
            ThreePointArc((-7.917321695, 23.7132034356), (-12.5, 21.6506350946), (-16.5775757328, 18.7132034356))
            ThreePointArc((-16.5775757328, 18.7132034356), (-21.6506350946, 12.5), (-24.4948974278, 5))
            ThreePointArc((-24.4948974278, 5), (-25, 0), (-24.4948974278, -5))
            ThreePointArc((-24.4948974278, -5), (-21.6506350946, -12.5), (-16.5775757328, -18.7132034356))
            ThreePointArc((-16.5775757328, -18.7132034356), (-12.5, -21.6506350946), (-7.917321695, -23.7132034356))
            ThreePointArc((-7.917321695, -23.7132034356), (0, -25), (7.917321695, -23.7132034356))
            ThreePointArc((7.917321695, -23.7132034356), (12.5, -21.6506350946), (16.5775757328, -18.7132034356))
            ThreePointArc((16.5775757328, -18.7132034356), (21.6506350946, -12.5), (24.4948974278, -5))
            ThreePointArc((24.4948974278, -5), (24.8734038251, -2.5127240501), (25, 0))
        make_face()
        with BuildLine():
            Line((15, 35.9807621135), (15, 81.1249036979))
            ThreePointArc((15, 81.1249036979), (0, 82.5), (-15, 81.1249036979))
            Line((-15, 81.1249036979), (-15, 35.9807621135))
            Line((-15, 35.9807621135), (-7.917321695, 23.7132034356))
            ThreePointArc((-7.917321695, 23.7132034356), (0, 25), (7.917321695, 23.7132034356))
            Line((7.917321695, 23.7132034356), (15, 35.9807621135))
        make_face()
    extrude(amount=F1_DEPTH)

    # F2 (on face) → F3 (join)
    with BuildSketch(Plane.XY.offset(20)):
        Circle(F2_R)
        with BuildLine():
            ThreePointArc((82.34834546, 5), (82.4620776492, 2.5011496906), (82.5, 0))
            ThreePointArc((82.5, 0), (82.4620776492, -2.5011496906), (82.34834546, -5))
            ThreePointArc((82.34834546, -5), (71.4470958122, -41.25), (45.5042997489, -68.815759128))
            ThreePointArc((45.5042997489, -68.815759128), (41.25, -71.4470958122), (36.8440457111, -73.815759128))
            ThreePointArc((36.8440457111, -73.815759128), (0, -82.5), (-36.8440457111, -73.815759128))
            ThreePointArc((-36.8440457111, -73.815759128), (-41.25, -71.4470958122), (-45.5042997489, -68.815759128))
            ThreePointArc((-45.5042997489, -68.815759128), (-71.4470958122, -41.25), (-82.34834546, -5))
            ThreePointArc((-82.34834546, -5), (-82.5, 0), (-82.34834546, 5))
            ThreePointArc((-82.34834546, 5), (-71.4470958122, 41.25), (-45.5042997489, 68.815759128))
            ThreePointArc((-45.5042997489, 68.815759128), (-41.25, 71.4470958122), (-36.8440457111, 73.815759128))
            ThreePointArc((-36.8440457111, 73.815759128), (-26.1783721325, 78.2364546263), (-15, 81.1249036979))
            ThreePointArc((-15, 81.1249036979), (0, 82.5), (15, 81.1249036979))
            ThreePointArc((15, 81.1249036979), (26.1783721325, 78.2364546263), (36.8440457111, 73.815759128))
            ThreePointArc((36.8440457111, 73.815759128), (41.25, 71.4470958122), (45.5042997489, 68.815759128))
            ThreePointArc((45.5042997489, 68.815759128), (71.4470958122, 41.25), (82.34834546, 5))
        make_face(mode=Mode.SUBTRACT)
    extrude(amount=F3_DEPTH)


solid = f1.part
